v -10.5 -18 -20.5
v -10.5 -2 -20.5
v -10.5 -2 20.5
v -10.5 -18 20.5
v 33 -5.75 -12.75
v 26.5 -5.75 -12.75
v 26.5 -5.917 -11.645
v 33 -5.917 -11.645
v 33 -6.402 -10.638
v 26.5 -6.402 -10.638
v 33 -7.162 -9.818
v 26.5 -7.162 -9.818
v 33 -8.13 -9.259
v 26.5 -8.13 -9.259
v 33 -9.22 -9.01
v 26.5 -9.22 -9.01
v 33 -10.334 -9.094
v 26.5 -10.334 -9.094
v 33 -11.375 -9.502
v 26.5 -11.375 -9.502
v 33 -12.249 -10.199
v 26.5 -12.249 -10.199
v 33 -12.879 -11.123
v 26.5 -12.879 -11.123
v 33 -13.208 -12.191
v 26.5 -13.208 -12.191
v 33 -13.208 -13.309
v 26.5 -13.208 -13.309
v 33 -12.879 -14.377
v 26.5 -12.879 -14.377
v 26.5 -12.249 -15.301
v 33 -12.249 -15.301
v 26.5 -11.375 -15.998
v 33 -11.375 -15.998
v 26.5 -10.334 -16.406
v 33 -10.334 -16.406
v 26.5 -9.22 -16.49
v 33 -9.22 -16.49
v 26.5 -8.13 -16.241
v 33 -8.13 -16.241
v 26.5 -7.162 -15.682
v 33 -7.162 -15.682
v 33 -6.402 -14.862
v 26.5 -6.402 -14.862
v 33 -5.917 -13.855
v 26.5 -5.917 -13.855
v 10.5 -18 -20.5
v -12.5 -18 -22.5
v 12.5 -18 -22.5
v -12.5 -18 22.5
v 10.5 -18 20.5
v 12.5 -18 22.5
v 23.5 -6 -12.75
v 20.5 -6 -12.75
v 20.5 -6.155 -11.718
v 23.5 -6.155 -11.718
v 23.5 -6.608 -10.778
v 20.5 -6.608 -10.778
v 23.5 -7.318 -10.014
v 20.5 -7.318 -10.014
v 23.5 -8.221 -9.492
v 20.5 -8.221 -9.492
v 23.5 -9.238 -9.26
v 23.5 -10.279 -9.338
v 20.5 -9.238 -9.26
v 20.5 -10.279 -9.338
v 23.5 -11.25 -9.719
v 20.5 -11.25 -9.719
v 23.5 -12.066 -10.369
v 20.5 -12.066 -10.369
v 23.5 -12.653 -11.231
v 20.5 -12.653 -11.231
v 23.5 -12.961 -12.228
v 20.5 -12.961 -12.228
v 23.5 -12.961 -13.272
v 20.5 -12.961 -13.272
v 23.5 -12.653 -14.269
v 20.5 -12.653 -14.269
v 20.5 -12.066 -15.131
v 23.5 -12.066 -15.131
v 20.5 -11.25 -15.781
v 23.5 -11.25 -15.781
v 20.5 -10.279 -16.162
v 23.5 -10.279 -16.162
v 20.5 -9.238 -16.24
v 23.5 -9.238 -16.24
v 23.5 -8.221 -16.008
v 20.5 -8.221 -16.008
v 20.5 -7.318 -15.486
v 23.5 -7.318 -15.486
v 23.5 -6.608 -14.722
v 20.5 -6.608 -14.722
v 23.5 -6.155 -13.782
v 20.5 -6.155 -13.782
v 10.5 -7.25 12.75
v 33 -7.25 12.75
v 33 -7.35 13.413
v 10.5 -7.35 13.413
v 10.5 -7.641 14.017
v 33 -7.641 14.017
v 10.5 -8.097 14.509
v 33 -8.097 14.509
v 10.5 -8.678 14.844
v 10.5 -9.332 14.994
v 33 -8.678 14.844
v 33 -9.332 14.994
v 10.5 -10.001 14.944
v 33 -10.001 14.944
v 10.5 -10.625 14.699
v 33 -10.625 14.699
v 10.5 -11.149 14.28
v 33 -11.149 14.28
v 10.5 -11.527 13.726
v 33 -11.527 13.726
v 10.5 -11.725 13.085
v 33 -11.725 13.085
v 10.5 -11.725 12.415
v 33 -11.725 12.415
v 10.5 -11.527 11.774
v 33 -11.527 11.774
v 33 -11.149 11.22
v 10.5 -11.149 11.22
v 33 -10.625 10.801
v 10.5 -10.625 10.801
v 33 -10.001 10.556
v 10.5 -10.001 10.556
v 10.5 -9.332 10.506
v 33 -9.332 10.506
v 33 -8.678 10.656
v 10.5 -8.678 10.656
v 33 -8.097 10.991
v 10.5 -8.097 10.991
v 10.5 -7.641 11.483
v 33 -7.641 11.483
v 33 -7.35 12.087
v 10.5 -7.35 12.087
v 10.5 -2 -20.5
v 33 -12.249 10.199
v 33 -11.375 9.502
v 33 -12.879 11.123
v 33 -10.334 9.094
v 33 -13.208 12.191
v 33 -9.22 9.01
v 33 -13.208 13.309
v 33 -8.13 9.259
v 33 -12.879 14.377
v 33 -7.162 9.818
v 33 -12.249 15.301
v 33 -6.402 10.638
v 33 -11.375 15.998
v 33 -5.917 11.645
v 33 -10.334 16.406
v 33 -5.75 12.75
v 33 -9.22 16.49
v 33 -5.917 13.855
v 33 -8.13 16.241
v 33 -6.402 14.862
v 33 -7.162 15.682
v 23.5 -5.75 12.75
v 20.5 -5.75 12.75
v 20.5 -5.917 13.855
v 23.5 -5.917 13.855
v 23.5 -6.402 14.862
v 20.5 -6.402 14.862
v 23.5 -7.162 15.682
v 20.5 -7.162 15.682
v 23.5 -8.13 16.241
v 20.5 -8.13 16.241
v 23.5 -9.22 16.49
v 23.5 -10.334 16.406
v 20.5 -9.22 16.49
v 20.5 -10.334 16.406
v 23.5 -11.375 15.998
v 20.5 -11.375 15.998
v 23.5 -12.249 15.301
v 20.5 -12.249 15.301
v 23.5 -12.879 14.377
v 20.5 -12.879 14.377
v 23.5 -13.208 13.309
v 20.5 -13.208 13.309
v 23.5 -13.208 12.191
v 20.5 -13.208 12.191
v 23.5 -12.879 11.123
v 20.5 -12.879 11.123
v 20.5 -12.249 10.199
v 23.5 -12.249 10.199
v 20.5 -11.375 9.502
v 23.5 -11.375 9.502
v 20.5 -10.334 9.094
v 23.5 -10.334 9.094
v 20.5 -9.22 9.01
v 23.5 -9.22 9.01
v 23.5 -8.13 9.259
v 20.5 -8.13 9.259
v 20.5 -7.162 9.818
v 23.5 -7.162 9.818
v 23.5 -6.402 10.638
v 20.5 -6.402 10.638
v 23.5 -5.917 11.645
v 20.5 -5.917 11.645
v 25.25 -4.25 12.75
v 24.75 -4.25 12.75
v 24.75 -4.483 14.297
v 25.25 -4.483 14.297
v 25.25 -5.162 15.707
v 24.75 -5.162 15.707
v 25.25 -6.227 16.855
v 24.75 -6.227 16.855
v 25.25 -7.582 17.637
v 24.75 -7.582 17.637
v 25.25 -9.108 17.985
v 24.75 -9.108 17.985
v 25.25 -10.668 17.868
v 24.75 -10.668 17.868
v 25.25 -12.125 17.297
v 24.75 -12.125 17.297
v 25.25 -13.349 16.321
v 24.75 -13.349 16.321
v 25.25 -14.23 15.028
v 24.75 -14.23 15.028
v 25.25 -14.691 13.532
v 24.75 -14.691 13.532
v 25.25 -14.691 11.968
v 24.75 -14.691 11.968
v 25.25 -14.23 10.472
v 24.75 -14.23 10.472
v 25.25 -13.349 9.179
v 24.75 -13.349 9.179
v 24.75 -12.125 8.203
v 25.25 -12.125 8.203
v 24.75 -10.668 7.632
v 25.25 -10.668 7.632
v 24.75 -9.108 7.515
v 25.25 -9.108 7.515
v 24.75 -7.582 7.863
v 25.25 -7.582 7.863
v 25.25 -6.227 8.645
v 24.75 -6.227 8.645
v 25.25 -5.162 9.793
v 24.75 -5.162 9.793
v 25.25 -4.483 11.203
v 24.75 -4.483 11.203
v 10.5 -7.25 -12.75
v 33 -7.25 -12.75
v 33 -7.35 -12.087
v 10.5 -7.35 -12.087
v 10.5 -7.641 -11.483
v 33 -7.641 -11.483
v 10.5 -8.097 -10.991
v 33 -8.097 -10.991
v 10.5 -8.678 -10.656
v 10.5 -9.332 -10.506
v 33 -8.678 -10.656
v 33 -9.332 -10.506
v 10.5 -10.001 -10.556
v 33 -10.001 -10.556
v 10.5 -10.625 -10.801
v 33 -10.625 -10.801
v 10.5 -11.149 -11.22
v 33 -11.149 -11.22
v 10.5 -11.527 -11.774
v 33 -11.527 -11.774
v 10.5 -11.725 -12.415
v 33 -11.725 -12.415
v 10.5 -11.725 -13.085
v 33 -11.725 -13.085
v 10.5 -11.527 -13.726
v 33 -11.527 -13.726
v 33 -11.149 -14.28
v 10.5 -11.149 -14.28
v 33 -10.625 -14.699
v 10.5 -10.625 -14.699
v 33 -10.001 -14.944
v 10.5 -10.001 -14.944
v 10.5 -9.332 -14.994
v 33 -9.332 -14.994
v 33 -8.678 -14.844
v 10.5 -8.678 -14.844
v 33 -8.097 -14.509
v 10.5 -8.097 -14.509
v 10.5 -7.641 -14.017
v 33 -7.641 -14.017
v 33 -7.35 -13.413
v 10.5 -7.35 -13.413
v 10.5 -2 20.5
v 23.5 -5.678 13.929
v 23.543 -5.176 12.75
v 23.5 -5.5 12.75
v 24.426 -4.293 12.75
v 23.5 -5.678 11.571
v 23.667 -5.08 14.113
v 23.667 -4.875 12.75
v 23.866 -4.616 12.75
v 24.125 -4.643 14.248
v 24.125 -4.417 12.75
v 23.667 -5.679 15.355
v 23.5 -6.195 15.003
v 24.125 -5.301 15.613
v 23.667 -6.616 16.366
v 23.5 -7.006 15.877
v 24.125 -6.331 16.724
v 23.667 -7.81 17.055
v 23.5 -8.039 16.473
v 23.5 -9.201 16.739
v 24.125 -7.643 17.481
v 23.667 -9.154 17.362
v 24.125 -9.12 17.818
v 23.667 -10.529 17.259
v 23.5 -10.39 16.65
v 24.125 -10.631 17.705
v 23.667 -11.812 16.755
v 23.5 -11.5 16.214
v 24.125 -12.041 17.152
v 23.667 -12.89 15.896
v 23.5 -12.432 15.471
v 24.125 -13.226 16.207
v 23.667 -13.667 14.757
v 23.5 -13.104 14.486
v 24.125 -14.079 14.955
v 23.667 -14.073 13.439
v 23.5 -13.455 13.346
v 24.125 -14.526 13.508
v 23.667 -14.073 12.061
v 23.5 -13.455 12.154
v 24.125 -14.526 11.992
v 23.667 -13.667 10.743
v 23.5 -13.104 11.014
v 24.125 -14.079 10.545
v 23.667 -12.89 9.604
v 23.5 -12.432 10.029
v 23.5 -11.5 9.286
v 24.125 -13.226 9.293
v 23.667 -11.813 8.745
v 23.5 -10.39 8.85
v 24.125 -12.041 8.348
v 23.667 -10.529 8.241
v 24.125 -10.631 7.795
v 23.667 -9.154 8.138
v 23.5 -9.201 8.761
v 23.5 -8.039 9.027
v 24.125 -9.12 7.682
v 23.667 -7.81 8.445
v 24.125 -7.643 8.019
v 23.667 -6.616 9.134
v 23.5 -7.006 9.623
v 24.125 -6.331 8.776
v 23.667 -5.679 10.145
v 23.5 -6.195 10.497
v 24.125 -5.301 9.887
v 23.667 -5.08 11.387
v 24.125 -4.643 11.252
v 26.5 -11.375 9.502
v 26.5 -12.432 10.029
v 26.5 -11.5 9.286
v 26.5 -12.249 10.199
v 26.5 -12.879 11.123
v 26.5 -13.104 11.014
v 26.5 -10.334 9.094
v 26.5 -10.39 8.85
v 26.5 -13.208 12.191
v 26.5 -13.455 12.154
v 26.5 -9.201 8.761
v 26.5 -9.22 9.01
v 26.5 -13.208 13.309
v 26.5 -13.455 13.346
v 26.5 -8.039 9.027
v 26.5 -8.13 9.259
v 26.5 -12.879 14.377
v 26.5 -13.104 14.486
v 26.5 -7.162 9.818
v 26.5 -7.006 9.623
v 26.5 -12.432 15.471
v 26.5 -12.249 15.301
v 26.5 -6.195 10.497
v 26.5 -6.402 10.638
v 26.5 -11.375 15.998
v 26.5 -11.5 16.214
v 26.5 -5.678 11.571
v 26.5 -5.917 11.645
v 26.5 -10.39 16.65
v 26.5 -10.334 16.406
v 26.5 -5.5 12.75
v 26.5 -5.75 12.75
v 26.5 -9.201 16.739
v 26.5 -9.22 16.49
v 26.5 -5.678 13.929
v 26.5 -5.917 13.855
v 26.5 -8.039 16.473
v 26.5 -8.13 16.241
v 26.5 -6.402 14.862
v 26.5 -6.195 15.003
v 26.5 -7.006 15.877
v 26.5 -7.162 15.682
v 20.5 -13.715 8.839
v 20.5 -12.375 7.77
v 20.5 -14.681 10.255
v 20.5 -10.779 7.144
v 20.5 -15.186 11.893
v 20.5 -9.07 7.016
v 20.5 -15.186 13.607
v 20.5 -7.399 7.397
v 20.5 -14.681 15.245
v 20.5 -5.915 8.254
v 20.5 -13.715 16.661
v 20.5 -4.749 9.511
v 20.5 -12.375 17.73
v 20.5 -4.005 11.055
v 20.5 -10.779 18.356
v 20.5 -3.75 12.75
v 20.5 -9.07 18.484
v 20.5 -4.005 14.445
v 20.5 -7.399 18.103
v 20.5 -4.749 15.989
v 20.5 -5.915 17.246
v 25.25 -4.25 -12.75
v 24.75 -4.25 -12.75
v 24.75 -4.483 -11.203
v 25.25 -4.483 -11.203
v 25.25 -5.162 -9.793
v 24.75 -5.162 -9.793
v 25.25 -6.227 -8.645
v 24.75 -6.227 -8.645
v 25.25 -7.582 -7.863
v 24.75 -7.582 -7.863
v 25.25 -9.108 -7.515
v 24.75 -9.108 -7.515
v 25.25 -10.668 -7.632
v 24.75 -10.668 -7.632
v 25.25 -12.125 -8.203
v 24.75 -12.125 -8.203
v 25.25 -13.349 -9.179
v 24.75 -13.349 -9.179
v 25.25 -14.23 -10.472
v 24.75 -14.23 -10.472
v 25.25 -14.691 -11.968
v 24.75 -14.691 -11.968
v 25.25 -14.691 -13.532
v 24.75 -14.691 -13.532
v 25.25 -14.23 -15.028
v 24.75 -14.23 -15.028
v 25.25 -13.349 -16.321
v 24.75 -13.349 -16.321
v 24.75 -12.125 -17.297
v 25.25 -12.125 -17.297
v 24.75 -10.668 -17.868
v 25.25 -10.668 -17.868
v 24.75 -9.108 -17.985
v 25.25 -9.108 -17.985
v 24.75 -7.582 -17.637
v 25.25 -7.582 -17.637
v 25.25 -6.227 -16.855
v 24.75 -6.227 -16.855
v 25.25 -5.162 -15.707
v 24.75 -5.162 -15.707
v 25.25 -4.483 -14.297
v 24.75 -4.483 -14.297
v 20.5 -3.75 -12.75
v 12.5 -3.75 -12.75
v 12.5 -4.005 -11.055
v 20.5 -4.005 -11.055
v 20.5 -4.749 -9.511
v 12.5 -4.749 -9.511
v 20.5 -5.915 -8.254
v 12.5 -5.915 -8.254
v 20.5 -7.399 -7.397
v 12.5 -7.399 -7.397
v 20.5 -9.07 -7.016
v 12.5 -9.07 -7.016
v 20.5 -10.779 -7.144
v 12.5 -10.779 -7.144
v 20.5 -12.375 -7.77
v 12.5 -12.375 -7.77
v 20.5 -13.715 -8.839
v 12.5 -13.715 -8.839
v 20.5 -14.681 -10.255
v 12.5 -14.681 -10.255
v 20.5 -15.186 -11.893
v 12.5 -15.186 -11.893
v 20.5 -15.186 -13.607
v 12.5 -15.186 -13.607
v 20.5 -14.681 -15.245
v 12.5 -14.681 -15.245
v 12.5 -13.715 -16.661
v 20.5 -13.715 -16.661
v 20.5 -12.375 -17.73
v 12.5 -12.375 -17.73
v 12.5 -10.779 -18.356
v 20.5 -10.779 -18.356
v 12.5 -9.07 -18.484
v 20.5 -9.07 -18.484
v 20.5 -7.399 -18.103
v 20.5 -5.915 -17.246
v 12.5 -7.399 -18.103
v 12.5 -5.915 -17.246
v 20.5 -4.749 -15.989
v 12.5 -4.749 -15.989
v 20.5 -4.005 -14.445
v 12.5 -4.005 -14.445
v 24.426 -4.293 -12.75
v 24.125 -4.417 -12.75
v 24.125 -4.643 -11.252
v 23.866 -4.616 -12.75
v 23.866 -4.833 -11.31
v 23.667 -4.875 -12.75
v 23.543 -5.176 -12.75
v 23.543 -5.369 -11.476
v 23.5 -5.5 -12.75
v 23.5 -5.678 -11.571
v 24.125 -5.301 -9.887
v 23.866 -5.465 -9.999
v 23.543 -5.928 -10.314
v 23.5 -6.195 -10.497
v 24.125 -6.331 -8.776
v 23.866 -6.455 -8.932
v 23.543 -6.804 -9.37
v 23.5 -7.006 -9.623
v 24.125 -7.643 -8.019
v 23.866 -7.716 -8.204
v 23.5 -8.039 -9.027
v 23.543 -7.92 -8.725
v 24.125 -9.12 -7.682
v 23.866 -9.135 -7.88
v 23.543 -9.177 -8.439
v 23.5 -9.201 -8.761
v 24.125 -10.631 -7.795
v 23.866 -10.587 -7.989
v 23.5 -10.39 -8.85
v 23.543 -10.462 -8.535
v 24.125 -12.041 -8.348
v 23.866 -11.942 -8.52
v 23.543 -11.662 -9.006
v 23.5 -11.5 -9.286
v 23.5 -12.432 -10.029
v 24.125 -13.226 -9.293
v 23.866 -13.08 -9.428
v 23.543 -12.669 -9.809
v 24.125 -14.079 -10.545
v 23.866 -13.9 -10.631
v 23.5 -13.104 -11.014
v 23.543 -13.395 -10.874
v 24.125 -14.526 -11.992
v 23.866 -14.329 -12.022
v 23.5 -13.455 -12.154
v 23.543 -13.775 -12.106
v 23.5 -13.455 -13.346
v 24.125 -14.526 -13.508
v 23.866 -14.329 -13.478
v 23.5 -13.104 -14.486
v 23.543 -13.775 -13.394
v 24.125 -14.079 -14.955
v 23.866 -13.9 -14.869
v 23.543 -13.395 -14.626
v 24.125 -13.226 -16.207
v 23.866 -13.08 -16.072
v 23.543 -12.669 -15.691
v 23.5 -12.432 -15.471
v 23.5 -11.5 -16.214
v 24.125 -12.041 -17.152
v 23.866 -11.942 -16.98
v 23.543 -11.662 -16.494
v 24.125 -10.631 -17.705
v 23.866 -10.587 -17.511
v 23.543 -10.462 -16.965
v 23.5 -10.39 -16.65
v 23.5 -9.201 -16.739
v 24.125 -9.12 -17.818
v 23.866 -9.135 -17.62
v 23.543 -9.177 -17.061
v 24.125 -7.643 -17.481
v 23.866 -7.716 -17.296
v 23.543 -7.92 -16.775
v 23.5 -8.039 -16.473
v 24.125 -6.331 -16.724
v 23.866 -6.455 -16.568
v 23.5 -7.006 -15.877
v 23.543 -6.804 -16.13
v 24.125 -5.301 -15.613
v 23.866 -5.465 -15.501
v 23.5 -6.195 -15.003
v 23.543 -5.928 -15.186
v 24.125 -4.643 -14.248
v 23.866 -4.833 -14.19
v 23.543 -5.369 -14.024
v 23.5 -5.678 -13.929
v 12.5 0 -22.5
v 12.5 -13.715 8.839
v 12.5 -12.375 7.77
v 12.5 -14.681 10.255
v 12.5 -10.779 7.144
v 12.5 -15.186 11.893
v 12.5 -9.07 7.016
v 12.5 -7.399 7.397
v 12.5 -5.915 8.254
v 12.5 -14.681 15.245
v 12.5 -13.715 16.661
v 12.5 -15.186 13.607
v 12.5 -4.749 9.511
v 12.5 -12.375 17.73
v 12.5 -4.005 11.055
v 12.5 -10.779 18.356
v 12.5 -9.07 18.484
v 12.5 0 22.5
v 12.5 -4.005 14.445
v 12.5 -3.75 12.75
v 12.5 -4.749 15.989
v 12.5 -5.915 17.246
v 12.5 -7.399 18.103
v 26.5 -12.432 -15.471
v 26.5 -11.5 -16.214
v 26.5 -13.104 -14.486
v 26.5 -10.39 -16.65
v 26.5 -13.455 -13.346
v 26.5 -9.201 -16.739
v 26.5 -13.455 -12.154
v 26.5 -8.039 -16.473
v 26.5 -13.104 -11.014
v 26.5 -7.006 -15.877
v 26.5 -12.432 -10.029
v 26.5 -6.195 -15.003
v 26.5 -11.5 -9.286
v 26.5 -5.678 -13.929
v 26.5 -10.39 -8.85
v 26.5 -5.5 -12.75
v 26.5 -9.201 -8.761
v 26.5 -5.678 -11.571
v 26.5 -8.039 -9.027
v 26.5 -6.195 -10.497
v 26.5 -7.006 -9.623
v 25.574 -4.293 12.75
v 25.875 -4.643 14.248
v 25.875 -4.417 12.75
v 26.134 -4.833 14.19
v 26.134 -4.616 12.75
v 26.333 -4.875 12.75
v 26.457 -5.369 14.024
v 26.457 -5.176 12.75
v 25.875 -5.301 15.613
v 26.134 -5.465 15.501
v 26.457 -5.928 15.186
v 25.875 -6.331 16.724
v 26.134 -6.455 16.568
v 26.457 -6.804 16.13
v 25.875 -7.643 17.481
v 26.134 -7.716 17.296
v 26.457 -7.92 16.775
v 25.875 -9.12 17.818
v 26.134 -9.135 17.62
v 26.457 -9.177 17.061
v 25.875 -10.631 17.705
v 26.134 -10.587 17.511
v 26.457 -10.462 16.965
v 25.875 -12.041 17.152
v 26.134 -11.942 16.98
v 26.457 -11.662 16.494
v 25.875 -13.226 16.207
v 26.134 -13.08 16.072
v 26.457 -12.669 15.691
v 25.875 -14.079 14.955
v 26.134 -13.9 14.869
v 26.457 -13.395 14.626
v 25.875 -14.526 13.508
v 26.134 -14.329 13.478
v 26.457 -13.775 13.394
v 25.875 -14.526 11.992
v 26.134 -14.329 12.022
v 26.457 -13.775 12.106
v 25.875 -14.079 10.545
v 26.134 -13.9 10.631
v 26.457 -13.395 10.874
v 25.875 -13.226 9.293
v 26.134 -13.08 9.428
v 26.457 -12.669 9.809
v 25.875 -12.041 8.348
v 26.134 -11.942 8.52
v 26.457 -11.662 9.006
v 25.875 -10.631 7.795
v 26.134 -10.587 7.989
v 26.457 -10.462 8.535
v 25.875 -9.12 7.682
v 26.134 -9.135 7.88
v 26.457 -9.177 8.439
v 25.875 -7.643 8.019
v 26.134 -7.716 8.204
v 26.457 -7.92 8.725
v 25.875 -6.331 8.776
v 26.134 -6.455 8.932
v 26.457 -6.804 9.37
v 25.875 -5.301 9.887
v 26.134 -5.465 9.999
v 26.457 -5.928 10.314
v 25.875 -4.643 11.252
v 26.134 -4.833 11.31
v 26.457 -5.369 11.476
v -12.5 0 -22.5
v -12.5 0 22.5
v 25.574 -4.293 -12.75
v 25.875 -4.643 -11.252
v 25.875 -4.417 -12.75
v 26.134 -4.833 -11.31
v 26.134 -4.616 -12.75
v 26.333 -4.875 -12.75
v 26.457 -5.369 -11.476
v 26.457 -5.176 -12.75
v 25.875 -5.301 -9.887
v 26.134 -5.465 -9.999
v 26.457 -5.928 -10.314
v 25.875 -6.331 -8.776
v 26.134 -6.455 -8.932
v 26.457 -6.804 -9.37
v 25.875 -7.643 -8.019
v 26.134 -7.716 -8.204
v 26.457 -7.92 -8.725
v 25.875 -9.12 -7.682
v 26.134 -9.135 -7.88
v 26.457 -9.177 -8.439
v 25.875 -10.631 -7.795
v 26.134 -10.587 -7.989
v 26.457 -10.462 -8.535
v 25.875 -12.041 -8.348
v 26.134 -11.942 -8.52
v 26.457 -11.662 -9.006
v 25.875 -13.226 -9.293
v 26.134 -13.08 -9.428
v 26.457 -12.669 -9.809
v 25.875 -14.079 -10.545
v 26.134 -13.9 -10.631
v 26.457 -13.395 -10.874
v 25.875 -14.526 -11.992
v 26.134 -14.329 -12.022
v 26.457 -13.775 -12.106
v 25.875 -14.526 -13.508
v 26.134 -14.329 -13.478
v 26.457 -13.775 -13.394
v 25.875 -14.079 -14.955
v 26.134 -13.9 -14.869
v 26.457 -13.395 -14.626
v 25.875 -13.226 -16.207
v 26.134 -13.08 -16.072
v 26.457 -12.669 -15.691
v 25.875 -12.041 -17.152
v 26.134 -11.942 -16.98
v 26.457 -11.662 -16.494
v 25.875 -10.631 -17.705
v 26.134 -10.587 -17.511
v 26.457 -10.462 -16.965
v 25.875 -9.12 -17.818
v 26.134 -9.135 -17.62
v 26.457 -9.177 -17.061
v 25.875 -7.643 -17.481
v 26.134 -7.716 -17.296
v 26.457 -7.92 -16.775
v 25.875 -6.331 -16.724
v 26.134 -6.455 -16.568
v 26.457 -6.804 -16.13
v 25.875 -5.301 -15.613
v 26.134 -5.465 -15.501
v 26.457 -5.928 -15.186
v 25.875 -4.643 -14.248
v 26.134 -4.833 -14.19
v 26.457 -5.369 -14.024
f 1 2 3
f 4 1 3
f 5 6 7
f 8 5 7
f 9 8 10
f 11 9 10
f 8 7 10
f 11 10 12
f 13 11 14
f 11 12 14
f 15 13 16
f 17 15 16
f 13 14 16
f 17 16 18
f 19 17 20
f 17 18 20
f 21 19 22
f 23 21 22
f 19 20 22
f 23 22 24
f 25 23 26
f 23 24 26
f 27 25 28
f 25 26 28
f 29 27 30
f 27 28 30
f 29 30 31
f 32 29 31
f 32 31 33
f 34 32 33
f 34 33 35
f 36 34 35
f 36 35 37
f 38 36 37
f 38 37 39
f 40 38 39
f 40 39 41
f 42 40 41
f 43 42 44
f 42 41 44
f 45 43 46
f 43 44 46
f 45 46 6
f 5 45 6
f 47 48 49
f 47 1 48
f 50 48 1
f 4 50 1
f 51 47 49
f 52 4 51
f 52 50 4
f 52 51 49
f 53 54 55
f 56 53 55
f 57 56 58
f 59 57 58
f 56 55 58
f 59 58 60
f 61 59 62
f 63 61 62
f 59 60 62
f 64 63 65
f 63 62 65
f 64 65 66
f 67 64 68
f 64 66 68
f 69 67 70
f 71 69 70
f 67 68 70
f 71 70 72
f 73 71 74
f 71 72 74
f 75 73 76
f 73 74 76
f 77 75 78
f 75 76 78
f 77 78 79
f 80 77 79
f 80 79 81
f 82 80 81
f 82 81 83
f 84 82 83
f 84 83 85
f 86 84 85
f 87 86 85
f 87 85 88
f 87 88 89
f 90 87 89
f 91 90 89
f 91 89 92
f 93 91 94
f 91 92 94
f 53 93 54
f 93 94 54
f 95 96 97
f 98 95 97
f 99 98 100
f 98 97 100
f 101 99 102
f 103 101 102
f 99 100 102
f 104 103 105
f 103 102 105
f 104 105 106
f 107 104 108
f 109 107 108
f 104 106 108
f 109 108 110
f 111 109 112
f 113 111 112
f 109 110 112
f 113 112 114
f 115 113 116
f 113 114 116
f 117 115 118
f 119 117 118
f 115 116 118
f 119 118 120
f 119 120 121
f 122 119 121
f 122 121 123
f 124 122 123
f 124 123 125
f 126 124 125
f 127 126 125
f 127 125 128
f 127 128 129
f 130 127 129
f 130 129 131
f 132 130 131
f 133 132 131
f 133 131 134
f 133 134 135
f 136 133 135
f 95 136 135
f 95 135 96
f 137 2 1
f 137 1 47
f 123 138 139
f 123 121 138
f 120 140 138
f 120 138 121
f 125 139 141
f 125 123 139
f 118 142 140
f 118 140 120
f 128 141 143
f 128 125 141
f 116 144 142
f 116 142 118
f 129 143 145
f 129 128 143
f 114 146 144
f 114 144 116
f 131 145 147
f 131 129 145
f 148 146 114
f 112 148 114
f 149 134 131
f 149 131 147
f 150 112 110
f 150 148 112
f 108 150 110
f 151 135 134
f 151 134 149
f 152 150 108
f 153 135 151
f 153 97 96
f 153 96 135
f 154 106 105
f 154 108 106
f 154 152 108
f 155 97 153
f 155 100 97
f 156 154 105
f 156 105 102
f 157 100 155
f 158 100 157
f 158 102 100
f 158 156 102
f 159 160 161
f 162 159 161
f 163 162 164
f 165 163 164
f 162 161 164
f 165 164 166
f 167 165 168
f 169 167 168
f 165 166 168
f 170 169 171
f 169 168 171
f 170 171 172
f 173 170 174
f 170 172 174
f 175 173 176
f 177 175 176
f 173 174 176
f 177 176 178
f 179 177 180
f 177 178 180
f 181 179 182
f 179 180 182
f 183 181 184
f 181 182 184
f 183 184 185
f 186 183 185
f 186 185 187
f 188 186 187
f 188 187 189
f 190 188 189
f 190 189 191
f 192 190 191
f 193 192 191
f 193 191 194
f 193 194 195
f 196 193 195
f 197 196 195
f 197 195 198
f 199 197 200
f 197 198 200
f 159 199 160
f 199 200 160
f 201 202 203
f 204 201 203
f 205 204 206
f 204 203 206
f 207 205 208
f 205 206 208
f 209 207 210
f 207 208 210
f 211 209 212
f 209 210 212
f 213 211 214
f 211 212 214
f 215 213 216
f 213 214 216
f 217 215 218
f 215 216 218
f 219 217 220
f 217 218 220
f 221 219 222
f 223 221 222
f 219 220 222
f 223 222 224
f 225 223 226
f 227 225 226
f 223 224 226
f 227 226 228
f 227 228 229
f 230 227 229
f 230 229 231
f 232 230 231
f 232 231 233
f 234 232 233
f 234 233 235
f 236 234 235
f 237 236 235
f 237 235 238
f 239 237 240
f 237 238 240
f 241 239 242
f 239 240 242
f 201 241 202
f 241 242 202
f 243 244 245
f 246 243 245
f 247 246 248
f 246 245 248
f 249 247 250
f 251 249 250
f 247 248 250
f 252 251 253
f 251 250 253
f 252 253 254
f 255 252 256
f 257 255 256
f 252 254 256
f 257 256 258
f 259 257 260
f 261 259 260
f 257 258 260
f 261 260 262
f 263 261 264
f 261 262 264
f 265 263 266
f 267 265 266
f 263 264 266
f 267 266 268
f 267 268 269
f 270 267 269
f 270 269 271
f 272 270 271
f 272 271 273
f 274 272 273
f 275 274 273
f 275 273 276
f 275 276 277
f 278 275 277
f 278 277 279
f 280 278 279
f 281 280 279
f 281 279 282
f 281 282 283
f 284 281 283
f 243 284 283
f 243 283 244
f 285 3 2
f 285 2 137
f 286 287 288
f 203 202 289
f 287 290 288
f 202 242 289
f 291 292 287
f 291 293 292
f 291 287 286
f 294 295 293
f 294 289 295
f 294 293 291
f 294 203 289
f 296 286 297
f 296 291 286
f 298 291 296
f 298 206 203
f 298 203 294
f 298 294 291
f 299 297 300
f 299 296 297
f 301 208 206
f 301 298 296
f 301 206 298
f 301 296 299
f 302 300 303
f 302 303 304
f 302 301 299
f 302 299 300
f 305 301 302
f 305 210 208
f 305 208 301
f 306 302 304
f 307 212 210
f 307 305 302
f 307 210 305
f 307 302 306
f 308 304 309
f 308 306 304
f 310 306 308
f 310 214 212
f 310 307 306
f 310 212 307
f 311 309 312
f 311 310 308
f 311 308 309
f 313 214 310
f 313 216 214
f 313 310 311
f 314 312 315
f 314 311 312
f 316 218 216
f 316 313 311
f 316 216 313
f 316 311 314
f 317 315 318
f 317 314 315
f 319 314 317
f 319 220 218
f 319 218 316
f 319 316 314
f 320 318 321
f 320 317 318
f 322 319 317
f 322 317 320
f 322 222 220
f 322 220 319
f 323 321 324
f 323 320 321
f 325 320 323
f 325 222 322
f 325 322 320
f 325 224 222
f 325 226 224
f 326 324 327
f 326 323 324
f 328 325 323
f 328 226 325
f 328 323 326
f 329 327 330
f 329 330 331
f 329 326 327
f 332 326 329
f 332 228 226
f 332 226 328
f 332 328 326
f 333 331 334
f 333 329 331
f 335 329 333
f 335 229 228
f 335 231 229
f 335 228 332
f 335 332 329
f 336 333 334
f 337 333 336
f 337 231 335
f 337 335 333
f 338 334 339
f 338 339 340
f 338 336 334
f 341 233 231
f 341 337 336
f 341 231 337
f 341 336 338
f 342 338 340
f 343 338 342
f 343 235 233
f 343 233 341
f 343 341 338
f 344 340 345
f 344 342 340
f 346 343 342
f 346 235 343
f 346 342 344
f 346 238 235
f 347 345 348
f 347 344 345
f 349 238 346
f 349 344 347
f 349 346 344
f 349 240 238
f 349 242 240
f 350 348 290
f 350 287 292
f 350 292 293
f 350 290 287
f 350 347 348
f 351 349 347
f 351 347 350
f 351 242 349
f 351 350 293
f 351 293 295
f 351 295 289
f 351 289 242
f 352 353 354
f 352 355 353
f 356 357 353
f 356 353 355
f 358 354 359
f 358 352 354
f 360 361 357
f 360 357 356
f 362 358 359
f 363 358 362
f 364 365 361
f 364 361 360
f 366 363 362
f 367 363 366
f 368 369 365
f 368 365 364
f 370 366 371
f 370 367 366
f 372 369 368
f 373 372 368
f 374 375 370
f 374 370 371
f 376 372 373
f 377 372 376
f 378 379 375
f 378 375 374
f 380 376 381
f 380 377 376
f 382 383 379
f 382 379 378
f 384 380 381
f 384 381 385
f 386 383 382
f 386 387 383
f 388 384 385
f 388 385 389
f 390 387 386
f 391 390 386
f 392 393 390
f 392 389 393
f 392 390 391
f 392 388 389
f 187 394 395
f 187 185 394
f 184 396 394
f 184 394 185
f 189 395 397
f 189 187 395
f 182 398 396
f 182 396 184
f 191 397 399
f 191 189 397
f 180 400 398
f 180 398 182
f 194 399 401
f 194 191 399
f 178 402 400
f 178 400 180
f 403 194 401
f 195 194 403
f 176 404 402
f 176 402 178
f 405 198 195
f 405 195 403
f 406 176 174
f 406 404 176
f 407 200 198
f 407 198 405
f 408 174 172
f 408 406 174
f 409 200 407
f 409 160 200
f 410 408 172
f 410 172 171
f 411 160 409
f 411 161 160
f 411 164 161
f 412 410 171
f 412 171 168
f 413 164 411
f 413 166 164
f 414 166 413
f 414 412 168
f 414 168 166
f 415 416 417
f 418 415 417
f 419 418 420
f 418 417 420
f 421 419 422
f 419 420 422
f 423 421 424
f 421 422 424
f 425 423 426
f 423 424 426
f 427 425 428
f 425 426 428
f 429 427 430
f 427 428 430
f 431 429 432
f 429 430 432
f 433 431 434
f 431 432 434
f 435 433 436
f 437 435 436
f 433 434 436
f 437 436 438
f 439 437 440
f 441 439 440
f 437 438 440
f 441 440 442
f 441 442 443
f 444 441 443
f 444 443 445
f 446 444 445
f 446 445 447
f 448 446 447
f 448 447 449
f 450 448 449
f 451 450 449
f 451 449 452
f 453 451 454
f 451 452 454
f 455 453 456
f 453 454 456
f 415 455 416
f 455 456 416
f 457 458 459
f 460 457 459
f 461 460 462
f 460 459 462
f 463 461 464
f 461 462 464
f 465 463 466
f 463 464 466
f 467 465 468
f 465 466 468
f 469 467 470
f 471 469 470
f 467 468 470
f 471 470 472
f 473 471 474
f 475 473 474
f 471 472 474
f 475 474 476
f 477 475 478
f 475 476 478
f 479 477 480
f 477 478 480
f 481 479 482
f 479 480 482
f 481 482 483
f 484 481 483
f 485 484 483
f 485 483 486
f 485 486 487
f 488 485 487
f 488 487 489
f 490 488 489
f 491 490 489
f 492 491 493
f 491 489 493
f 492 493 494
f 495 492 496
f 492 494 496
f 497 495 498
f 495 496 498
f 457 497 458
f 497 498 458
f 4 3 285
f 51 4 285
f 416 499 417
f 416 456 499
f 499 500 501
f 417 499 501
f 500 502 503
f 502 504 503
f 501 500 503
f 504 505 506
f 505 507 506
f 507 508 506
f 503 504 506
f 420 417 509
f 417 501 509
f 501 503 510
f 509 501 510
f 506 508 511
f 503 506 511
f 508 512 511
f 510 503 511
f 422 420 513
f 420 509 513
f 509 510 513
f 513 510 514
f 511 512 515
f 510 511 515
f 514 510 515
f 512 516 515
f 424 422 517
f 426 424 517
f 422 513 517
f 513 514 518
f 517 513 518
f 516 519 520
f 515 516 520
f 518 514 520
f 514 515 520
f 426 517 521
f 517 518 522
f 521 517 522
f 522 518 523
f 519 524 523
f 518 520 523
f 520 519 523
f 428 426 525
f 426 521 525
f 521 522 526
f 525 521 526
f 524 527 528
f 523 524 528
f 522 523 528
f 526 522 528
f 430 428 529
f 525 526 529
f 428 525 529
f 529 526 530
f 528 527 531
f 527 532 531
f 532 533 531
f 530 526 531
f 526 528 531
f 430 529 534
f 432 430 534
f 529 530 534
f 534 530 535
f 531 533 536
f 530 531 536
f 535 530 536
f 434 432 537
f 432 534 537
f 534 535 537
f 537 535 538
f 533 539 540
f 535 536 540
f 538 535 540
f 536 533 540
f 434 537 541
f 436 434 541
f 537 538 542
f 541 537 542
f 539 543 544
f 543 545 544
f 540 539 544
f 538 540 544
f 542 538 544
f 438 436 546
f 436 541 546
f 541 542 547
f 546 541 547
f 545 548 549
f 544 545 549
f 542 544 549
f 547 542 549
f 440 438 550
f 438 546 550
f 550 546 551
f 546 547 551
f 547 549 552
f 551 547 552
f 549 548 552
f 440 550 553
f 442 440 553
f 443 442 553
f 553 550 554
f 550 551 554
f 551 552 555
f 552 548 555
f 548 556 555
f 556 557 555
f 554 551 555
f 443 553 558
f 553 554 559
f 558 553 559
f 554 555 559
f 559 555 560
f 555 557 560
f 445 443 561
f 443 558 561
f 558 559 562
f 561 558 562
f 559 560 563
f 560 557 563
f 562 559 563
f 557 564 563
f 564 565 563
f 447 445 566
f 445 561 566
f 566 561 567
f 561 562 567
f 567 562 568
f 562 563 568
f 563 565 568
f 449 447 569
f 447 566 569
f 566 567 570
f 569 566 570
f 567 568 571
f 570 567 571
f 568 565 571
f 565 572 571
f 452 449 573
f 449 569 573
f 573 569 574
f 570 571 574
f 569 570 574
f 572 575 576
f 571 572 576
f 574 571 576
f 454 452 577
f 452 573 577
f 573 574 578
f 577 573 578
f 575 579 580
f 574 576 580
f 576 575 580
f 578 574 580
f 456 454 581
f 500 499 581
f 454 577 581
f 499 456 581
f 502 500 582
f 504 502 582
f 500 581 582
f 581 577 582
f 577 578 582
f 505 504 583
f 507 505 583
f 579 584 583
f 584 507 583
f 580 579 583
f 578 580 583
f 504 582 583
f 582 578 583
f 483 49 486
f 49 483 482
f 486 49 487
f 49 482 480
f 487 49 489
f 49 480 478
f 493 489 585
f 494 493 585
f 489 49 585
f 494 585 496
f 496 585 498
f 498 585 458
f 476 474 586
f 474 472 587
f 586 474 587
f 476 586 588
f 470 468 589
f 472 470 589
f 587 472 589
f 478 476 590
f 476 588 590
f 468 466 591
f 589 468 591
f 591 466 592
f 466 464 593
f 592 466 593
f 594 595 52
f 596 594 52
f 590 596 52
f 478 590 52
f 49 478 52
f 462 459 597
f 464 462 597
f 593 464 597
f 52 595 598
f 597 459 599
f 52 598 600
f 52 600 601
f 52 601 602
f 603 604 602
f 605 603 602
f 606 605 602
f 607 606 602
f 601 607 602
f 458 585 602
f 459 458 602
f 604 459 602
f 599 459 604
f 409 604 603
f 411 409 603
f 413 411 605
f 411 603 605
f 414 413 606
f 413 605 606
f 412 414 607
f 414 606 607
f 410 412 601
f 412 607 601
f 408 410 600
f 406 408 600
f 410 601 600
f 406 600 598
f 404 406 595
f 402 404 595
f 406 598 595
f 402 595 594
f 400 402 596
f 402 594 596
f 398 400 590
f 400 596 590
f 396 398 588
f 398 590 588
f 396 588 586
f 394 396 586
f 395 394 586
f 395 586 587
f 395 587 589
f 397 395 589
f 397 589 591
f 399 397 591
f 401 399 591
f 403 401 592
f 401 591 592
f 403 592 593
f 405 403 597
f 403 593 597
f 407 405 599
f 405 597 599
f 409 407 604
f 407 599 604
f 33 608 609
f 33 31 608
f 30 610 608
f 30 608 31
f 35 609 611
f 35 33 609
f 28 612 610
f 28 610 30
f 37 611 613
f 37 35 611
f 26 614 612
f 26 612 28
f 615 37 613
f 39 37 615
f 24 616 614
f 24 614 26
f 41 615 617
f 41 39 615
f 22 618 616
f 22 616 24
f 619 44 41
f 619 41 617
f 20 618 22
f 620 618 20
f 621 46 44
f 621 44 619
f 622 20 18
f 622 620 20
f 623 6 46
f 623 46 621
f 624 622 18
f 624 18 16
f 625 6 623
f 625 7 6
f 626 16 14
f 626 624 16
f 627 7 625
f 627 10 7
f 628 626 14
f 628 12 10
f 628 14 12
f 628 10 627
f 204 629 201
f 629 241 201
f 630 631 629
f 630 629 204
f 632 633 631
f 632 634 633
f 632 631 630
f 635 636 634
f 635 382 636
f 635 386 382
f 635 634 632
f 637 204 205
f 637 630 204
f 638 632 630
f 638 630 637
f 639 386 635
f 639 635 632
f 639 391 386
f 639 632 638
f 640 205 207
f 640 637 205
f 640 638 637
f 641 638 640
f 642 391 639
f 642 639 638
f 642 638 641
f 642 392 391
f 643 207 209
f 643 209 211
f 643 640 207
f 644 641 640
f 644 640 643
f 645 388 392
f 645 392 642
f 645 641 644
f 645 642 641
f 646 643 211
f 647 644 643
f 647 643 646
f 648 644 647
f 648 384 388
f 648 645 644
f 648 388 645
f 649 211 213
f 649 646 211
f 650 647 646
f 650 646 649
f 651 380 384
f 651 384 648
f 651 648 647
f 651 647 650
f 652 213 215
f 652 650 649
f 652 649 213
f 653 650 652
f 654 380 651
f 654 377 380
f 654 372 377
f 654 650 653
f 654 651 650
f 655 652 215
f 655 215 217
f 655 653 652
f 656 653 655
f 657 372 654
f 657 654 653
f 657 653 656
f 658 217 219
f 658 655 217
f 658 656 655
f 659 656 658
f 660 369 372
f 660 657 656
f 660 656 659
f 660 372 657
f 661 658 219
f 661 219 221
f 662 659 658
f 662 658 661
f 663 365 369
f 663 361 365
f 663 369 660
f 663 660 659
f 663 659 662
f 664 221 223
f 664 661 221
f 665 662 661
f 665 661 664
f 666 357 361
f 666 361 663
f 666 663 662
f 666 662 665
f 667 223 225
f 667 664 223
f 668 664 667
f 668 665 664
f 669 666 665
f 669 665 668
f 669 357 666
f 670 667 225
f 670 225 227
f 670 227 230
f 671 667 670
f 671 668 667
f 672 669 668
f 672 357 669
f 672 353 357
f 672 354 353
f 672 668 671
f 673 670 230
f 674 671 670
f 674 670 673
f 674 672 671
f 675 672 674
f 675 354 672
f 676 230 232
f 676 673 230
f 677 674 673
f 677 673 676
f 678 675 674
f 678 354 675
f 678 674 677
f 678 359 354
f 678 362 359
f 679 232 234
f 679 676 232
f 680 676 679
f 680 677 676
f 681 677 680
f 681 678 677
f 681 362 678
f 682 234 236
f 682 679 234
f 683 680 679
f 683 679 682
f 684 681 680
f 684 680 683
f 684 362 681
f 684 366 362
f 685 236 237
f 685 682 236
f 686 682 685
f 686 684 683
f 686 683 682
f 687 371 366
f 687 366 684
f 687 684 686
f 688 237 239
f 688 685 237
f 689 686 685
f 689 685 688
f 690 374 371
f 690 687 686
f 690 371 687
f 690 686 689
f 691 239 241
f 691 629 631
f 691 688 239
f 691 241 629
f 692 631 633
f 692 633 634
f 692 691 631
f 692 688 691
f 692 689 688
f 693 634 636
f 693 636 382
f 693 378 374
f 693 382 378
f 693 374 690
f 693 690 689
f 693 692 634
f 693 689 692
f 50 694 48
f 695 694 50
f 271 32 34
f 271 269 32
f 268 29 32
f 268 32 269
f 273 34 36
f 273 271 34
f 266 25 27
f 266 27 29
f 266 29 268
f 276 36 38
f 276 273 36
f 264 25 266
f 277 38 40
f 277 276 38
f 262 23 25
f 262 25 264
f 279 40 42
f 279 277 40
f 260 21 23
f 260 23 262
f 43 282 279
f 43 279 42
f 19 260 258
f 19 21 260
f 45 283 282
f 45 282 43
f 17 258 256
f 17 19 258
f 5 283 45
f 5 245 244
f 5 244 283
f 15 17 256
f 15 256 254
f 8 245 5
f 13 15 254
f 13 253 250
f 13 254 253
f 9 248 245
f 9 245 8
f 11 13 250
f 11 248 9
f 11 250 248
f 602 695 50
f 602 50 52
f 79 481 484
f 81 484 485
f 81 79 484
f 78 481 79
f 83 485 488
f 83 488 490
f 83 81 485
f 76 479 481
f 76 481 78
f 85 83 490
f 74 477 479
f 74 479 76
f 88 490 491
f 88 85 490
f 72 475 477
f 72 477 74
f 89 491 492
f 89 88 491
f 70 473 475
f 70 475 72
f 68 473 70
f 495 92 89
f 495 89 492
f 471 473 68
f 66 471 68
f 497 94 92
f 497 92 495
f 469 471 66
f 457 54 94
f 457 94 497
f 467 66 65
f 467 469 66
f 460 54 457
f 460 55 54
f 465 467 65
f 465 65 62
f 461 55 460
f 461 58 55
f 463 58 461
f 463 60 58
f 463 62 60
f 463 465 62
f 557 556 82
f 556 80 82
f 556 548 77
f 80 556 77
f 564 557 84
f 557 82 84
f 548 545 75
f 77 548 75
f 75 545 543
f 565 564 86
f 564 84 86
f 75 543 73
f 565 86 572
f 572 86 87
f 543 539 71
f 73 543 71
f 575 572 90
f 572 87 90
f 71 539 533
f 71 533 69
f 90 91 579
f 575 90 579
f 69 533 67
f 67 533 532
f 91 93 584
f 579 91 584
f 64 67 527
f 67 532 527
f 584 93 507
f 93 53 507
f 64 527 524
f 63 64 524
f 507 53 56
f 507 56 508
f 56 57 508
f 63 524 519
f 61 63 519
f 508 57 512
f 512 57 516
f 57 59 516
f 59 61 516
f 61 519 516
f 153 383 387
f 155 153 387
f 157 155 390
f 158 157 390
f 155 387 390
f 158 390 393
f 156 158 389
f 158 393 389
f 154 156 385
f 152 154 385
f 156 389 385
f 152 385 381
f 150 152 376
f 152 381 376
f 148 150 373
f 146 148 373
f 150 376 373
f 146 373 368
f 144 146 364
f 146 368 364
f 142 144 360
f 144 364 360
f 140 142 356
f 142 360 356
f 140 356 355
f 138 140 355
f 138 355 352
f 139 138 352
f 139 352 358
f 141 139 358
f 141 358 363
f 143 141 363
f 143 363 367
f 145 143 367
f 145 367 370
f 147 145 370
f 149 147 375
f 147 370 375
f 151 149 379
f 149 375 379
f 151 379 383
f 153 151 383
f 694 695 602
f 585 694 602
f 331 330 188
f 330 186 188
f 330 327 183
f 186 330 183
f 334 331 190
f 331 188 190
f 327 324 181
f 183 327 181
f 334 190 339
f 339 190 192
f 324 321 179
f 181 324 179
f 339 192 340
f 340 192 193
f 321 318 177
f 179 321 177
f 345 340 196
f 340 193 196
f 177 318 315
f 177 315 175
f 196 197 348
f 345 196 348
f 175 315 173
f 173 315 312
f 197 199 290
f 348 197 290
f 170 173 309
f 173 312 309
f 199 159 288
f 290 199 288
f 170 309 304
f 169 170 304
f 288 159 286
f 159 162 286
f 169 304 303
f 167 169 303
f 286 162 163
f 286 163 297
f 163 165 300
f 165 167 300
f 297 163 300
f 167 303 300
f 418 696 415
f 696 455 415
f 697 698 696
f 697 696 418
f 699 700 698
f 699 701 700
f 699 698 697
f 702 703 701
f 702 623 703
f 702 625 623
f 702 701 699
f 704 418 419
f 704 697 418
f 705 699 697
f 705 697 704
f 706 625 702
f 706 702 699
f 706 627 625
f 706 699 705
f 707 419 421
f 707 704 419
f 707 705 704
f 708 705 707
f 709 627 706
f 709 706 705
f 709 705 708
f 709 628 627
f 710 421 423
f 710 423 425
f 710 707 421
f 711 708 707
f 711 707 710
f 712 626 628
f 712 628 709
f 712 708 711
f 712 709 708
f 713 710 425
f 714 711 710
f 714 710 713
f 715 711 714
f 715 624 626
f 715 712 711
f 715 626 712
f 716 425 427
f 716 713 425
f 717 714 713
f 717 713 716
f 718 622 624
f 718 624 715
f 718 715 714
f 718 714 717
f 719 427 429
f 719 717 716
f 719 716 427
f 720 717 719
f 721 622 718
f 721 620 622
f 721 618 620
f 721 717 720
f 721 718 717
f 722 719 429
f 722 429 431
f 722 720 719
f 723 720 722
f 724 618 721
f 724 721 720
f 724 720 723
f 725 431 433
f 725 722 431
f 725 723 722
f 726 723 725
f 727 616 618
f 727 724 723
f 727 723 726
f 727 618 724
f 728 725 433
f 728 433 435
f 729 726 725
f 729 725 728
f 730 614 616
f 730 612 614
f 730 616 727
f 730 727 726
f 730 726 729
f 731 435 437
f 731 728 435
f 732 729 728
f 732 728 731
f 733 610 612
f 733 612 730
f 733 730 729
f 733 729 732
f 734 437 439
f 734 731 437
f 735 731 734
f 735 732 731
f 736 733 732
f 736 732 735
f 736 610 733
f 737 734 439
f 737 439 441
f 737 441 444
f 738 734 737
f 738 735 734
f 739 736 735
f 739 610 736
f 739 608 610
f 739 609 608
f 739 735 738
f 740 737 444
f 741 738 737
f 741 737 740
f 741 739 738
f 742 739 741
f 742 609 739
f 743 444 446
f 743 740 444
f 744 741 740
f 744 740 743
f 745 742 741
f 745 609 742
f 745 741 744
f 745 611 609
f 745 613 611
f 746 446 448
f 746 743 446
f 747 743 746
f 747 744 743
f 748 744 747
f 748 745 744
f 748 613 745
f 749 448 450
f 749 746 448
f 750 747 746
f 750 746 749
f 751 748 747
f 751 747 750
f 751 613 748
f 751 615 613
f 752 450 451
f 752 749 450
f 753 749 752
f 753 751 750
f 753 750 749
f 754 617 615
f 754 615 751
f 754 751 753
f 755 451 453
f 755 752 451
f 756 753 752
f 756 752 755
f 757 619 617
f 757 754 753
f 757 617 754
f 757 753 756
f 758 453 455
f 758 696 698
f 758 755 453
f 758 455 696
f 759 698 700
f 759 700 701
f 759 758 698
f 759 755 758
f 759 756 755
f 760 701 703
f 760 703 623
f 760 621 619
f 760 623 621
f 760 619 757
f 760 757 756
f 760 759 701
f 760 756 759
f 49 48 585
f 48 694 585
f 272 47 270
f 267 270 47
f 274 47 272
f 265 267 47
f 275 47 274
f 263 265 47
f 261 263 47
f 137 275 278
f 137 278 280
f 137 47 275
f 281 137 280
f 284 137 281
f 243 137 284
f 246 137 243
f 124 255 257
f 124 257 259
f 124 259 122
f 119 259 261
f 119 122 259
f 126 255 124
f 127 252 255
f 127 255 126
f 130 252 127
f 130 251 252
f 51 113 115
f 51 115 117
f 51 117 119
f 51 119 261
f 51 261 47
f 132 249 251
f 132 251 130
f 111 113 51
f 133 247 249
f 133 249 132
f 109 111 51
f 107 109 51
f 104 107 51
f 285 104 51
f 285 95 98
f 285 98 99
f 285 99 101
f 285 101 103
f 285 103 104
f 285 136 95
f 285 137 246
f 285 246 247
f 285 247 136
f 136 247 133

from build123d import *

# Parameters (mm, degrees)
F0_W      = 25
F0_H      = 45
F1_DEPTH  = 2
F2_W      = 25
F2_H      = 45
F2_W_2    = 21
F2_H_2    = 41
F3_DEPTH  = 16
F4_R      = 5.75
F5_DEPTH  = 8
F6_R      = 3.75
F7_DEPTH  = 3
F8_R      = 3.5
F9_DEPTH  = 3
F10_R     = 5.25
F11_DEPTH = 3
F12_R     = 5.25
F13_DEPTH = 3
F14_R     = 3.75
F15_DEPTH = 6.5
F16_R     = 3.75
F17_DEPTH = 6.5
F18_R     = 1.25
F19_R     = 2.25
F20_DEPTH = 25
F21_R     = 2.25
F22_DEPTH = 25


with BuildPart() as f1:
    # F0 (on Front) → F1 (new body)
    with BuildSketch(Plane.XZ):
        Rectangle(F0_W, F0_H)
    extrude(amount=F1_DEPTH)

    # F2 (on face) → F3 (join)
    with BuildSketch(Plane.XZ.offset(2)):
        Rectangle(F2_W, F2_H)
        Rectangle(F2_W_2, F2_H_2, mode=Mode.SUBTRACT)
    extrude(amount=F3_DEPTH)

    # F4 (on face) → F5 (join)
    with BuildSketch(Plane.YZ.offset(12.5)):
        with Locations((-9.5, 12.75)):
            Circle(F4_R)
        with Locations((-9.5, -12.75)):
            Circle(F4_R)
    extrude(amount=F5_DEPTH)

    # F6 (on face) → F7 (join)
    with BuildSketch(Plane.YZ.offset(20.5)):
        with Locations((-9.5, 12.75)):
            Circle(F6_R)
    extrude(amount=F7_DEPTH)

    # F8 (on face) → F9 (join)
    with BuildSketch(Plane.YZ.offset(20.5)):
        with Locations((-9.5, -12.75)):
            Circle(F8_R)
    extrude(amount=F9_DEPTH)

    # F10 (on face) → F11 (join)
    with BuildSketch(Plane.YZ.offset(23.5)):
        with Locations((-9.5, 12.75)):
            Circle(F10_R)
    extrude(amount=F11_DEPTH)

    # F12 (on face) → F13 (join)
    with BuildSketch(Plane.YZ.offset(23.5)):
        with Locations((-9.5, -12.75)):
            Circle(F12_R)
    extrude(amount=F13_DEPTH)

    # F14 (on face) → F15 (join)
    with BuildSketch(Plane.YZ.offset(26.5)):
        with Locations((-9.5, 12.75)):
            Circle(F14_R)
    extrude(amount=F15_DEPTH)

    # F16 (on face) → F17 (join)
    with BuildSketch(Plane.YZ.offset(26.5)):
        with Locations((-9.5, -12.75)):
            Circle(F16_R)
    extrude(amount=F17_DEPTH)

    # F18
    f18_edges = [f1.edges().sort_by_distance(p)[0] for p in [
        (26.5, -14.75, 12.75),
        (26.5, -14.75, -12.75),
        (23.5, -14.75, -12.75),
        (23.5, -14.75, 12.75),
    ]]
    fillet(f18_edges, radius=F18_R)

    # F19 (on face) → F20 (cut)
    with BuildSketch(Plane.YZ.offset(33)):
        with Locations((-9.5, 12.75)):
            Circle(F19_R)
    extrude(amount=-F20_DEPTH, mode=Mode.SUBTRACT)

    # F21 (on face) → F22 (cut)
    with BuildSketch(Plane.YZ.offset(33)):
        with Locations((-9.5, -12.75)):
            Circle(F21_R)
    extrude(amount=-F22_DEPTH, mode=Mode.SUBTRACT)


solid = f1.part
